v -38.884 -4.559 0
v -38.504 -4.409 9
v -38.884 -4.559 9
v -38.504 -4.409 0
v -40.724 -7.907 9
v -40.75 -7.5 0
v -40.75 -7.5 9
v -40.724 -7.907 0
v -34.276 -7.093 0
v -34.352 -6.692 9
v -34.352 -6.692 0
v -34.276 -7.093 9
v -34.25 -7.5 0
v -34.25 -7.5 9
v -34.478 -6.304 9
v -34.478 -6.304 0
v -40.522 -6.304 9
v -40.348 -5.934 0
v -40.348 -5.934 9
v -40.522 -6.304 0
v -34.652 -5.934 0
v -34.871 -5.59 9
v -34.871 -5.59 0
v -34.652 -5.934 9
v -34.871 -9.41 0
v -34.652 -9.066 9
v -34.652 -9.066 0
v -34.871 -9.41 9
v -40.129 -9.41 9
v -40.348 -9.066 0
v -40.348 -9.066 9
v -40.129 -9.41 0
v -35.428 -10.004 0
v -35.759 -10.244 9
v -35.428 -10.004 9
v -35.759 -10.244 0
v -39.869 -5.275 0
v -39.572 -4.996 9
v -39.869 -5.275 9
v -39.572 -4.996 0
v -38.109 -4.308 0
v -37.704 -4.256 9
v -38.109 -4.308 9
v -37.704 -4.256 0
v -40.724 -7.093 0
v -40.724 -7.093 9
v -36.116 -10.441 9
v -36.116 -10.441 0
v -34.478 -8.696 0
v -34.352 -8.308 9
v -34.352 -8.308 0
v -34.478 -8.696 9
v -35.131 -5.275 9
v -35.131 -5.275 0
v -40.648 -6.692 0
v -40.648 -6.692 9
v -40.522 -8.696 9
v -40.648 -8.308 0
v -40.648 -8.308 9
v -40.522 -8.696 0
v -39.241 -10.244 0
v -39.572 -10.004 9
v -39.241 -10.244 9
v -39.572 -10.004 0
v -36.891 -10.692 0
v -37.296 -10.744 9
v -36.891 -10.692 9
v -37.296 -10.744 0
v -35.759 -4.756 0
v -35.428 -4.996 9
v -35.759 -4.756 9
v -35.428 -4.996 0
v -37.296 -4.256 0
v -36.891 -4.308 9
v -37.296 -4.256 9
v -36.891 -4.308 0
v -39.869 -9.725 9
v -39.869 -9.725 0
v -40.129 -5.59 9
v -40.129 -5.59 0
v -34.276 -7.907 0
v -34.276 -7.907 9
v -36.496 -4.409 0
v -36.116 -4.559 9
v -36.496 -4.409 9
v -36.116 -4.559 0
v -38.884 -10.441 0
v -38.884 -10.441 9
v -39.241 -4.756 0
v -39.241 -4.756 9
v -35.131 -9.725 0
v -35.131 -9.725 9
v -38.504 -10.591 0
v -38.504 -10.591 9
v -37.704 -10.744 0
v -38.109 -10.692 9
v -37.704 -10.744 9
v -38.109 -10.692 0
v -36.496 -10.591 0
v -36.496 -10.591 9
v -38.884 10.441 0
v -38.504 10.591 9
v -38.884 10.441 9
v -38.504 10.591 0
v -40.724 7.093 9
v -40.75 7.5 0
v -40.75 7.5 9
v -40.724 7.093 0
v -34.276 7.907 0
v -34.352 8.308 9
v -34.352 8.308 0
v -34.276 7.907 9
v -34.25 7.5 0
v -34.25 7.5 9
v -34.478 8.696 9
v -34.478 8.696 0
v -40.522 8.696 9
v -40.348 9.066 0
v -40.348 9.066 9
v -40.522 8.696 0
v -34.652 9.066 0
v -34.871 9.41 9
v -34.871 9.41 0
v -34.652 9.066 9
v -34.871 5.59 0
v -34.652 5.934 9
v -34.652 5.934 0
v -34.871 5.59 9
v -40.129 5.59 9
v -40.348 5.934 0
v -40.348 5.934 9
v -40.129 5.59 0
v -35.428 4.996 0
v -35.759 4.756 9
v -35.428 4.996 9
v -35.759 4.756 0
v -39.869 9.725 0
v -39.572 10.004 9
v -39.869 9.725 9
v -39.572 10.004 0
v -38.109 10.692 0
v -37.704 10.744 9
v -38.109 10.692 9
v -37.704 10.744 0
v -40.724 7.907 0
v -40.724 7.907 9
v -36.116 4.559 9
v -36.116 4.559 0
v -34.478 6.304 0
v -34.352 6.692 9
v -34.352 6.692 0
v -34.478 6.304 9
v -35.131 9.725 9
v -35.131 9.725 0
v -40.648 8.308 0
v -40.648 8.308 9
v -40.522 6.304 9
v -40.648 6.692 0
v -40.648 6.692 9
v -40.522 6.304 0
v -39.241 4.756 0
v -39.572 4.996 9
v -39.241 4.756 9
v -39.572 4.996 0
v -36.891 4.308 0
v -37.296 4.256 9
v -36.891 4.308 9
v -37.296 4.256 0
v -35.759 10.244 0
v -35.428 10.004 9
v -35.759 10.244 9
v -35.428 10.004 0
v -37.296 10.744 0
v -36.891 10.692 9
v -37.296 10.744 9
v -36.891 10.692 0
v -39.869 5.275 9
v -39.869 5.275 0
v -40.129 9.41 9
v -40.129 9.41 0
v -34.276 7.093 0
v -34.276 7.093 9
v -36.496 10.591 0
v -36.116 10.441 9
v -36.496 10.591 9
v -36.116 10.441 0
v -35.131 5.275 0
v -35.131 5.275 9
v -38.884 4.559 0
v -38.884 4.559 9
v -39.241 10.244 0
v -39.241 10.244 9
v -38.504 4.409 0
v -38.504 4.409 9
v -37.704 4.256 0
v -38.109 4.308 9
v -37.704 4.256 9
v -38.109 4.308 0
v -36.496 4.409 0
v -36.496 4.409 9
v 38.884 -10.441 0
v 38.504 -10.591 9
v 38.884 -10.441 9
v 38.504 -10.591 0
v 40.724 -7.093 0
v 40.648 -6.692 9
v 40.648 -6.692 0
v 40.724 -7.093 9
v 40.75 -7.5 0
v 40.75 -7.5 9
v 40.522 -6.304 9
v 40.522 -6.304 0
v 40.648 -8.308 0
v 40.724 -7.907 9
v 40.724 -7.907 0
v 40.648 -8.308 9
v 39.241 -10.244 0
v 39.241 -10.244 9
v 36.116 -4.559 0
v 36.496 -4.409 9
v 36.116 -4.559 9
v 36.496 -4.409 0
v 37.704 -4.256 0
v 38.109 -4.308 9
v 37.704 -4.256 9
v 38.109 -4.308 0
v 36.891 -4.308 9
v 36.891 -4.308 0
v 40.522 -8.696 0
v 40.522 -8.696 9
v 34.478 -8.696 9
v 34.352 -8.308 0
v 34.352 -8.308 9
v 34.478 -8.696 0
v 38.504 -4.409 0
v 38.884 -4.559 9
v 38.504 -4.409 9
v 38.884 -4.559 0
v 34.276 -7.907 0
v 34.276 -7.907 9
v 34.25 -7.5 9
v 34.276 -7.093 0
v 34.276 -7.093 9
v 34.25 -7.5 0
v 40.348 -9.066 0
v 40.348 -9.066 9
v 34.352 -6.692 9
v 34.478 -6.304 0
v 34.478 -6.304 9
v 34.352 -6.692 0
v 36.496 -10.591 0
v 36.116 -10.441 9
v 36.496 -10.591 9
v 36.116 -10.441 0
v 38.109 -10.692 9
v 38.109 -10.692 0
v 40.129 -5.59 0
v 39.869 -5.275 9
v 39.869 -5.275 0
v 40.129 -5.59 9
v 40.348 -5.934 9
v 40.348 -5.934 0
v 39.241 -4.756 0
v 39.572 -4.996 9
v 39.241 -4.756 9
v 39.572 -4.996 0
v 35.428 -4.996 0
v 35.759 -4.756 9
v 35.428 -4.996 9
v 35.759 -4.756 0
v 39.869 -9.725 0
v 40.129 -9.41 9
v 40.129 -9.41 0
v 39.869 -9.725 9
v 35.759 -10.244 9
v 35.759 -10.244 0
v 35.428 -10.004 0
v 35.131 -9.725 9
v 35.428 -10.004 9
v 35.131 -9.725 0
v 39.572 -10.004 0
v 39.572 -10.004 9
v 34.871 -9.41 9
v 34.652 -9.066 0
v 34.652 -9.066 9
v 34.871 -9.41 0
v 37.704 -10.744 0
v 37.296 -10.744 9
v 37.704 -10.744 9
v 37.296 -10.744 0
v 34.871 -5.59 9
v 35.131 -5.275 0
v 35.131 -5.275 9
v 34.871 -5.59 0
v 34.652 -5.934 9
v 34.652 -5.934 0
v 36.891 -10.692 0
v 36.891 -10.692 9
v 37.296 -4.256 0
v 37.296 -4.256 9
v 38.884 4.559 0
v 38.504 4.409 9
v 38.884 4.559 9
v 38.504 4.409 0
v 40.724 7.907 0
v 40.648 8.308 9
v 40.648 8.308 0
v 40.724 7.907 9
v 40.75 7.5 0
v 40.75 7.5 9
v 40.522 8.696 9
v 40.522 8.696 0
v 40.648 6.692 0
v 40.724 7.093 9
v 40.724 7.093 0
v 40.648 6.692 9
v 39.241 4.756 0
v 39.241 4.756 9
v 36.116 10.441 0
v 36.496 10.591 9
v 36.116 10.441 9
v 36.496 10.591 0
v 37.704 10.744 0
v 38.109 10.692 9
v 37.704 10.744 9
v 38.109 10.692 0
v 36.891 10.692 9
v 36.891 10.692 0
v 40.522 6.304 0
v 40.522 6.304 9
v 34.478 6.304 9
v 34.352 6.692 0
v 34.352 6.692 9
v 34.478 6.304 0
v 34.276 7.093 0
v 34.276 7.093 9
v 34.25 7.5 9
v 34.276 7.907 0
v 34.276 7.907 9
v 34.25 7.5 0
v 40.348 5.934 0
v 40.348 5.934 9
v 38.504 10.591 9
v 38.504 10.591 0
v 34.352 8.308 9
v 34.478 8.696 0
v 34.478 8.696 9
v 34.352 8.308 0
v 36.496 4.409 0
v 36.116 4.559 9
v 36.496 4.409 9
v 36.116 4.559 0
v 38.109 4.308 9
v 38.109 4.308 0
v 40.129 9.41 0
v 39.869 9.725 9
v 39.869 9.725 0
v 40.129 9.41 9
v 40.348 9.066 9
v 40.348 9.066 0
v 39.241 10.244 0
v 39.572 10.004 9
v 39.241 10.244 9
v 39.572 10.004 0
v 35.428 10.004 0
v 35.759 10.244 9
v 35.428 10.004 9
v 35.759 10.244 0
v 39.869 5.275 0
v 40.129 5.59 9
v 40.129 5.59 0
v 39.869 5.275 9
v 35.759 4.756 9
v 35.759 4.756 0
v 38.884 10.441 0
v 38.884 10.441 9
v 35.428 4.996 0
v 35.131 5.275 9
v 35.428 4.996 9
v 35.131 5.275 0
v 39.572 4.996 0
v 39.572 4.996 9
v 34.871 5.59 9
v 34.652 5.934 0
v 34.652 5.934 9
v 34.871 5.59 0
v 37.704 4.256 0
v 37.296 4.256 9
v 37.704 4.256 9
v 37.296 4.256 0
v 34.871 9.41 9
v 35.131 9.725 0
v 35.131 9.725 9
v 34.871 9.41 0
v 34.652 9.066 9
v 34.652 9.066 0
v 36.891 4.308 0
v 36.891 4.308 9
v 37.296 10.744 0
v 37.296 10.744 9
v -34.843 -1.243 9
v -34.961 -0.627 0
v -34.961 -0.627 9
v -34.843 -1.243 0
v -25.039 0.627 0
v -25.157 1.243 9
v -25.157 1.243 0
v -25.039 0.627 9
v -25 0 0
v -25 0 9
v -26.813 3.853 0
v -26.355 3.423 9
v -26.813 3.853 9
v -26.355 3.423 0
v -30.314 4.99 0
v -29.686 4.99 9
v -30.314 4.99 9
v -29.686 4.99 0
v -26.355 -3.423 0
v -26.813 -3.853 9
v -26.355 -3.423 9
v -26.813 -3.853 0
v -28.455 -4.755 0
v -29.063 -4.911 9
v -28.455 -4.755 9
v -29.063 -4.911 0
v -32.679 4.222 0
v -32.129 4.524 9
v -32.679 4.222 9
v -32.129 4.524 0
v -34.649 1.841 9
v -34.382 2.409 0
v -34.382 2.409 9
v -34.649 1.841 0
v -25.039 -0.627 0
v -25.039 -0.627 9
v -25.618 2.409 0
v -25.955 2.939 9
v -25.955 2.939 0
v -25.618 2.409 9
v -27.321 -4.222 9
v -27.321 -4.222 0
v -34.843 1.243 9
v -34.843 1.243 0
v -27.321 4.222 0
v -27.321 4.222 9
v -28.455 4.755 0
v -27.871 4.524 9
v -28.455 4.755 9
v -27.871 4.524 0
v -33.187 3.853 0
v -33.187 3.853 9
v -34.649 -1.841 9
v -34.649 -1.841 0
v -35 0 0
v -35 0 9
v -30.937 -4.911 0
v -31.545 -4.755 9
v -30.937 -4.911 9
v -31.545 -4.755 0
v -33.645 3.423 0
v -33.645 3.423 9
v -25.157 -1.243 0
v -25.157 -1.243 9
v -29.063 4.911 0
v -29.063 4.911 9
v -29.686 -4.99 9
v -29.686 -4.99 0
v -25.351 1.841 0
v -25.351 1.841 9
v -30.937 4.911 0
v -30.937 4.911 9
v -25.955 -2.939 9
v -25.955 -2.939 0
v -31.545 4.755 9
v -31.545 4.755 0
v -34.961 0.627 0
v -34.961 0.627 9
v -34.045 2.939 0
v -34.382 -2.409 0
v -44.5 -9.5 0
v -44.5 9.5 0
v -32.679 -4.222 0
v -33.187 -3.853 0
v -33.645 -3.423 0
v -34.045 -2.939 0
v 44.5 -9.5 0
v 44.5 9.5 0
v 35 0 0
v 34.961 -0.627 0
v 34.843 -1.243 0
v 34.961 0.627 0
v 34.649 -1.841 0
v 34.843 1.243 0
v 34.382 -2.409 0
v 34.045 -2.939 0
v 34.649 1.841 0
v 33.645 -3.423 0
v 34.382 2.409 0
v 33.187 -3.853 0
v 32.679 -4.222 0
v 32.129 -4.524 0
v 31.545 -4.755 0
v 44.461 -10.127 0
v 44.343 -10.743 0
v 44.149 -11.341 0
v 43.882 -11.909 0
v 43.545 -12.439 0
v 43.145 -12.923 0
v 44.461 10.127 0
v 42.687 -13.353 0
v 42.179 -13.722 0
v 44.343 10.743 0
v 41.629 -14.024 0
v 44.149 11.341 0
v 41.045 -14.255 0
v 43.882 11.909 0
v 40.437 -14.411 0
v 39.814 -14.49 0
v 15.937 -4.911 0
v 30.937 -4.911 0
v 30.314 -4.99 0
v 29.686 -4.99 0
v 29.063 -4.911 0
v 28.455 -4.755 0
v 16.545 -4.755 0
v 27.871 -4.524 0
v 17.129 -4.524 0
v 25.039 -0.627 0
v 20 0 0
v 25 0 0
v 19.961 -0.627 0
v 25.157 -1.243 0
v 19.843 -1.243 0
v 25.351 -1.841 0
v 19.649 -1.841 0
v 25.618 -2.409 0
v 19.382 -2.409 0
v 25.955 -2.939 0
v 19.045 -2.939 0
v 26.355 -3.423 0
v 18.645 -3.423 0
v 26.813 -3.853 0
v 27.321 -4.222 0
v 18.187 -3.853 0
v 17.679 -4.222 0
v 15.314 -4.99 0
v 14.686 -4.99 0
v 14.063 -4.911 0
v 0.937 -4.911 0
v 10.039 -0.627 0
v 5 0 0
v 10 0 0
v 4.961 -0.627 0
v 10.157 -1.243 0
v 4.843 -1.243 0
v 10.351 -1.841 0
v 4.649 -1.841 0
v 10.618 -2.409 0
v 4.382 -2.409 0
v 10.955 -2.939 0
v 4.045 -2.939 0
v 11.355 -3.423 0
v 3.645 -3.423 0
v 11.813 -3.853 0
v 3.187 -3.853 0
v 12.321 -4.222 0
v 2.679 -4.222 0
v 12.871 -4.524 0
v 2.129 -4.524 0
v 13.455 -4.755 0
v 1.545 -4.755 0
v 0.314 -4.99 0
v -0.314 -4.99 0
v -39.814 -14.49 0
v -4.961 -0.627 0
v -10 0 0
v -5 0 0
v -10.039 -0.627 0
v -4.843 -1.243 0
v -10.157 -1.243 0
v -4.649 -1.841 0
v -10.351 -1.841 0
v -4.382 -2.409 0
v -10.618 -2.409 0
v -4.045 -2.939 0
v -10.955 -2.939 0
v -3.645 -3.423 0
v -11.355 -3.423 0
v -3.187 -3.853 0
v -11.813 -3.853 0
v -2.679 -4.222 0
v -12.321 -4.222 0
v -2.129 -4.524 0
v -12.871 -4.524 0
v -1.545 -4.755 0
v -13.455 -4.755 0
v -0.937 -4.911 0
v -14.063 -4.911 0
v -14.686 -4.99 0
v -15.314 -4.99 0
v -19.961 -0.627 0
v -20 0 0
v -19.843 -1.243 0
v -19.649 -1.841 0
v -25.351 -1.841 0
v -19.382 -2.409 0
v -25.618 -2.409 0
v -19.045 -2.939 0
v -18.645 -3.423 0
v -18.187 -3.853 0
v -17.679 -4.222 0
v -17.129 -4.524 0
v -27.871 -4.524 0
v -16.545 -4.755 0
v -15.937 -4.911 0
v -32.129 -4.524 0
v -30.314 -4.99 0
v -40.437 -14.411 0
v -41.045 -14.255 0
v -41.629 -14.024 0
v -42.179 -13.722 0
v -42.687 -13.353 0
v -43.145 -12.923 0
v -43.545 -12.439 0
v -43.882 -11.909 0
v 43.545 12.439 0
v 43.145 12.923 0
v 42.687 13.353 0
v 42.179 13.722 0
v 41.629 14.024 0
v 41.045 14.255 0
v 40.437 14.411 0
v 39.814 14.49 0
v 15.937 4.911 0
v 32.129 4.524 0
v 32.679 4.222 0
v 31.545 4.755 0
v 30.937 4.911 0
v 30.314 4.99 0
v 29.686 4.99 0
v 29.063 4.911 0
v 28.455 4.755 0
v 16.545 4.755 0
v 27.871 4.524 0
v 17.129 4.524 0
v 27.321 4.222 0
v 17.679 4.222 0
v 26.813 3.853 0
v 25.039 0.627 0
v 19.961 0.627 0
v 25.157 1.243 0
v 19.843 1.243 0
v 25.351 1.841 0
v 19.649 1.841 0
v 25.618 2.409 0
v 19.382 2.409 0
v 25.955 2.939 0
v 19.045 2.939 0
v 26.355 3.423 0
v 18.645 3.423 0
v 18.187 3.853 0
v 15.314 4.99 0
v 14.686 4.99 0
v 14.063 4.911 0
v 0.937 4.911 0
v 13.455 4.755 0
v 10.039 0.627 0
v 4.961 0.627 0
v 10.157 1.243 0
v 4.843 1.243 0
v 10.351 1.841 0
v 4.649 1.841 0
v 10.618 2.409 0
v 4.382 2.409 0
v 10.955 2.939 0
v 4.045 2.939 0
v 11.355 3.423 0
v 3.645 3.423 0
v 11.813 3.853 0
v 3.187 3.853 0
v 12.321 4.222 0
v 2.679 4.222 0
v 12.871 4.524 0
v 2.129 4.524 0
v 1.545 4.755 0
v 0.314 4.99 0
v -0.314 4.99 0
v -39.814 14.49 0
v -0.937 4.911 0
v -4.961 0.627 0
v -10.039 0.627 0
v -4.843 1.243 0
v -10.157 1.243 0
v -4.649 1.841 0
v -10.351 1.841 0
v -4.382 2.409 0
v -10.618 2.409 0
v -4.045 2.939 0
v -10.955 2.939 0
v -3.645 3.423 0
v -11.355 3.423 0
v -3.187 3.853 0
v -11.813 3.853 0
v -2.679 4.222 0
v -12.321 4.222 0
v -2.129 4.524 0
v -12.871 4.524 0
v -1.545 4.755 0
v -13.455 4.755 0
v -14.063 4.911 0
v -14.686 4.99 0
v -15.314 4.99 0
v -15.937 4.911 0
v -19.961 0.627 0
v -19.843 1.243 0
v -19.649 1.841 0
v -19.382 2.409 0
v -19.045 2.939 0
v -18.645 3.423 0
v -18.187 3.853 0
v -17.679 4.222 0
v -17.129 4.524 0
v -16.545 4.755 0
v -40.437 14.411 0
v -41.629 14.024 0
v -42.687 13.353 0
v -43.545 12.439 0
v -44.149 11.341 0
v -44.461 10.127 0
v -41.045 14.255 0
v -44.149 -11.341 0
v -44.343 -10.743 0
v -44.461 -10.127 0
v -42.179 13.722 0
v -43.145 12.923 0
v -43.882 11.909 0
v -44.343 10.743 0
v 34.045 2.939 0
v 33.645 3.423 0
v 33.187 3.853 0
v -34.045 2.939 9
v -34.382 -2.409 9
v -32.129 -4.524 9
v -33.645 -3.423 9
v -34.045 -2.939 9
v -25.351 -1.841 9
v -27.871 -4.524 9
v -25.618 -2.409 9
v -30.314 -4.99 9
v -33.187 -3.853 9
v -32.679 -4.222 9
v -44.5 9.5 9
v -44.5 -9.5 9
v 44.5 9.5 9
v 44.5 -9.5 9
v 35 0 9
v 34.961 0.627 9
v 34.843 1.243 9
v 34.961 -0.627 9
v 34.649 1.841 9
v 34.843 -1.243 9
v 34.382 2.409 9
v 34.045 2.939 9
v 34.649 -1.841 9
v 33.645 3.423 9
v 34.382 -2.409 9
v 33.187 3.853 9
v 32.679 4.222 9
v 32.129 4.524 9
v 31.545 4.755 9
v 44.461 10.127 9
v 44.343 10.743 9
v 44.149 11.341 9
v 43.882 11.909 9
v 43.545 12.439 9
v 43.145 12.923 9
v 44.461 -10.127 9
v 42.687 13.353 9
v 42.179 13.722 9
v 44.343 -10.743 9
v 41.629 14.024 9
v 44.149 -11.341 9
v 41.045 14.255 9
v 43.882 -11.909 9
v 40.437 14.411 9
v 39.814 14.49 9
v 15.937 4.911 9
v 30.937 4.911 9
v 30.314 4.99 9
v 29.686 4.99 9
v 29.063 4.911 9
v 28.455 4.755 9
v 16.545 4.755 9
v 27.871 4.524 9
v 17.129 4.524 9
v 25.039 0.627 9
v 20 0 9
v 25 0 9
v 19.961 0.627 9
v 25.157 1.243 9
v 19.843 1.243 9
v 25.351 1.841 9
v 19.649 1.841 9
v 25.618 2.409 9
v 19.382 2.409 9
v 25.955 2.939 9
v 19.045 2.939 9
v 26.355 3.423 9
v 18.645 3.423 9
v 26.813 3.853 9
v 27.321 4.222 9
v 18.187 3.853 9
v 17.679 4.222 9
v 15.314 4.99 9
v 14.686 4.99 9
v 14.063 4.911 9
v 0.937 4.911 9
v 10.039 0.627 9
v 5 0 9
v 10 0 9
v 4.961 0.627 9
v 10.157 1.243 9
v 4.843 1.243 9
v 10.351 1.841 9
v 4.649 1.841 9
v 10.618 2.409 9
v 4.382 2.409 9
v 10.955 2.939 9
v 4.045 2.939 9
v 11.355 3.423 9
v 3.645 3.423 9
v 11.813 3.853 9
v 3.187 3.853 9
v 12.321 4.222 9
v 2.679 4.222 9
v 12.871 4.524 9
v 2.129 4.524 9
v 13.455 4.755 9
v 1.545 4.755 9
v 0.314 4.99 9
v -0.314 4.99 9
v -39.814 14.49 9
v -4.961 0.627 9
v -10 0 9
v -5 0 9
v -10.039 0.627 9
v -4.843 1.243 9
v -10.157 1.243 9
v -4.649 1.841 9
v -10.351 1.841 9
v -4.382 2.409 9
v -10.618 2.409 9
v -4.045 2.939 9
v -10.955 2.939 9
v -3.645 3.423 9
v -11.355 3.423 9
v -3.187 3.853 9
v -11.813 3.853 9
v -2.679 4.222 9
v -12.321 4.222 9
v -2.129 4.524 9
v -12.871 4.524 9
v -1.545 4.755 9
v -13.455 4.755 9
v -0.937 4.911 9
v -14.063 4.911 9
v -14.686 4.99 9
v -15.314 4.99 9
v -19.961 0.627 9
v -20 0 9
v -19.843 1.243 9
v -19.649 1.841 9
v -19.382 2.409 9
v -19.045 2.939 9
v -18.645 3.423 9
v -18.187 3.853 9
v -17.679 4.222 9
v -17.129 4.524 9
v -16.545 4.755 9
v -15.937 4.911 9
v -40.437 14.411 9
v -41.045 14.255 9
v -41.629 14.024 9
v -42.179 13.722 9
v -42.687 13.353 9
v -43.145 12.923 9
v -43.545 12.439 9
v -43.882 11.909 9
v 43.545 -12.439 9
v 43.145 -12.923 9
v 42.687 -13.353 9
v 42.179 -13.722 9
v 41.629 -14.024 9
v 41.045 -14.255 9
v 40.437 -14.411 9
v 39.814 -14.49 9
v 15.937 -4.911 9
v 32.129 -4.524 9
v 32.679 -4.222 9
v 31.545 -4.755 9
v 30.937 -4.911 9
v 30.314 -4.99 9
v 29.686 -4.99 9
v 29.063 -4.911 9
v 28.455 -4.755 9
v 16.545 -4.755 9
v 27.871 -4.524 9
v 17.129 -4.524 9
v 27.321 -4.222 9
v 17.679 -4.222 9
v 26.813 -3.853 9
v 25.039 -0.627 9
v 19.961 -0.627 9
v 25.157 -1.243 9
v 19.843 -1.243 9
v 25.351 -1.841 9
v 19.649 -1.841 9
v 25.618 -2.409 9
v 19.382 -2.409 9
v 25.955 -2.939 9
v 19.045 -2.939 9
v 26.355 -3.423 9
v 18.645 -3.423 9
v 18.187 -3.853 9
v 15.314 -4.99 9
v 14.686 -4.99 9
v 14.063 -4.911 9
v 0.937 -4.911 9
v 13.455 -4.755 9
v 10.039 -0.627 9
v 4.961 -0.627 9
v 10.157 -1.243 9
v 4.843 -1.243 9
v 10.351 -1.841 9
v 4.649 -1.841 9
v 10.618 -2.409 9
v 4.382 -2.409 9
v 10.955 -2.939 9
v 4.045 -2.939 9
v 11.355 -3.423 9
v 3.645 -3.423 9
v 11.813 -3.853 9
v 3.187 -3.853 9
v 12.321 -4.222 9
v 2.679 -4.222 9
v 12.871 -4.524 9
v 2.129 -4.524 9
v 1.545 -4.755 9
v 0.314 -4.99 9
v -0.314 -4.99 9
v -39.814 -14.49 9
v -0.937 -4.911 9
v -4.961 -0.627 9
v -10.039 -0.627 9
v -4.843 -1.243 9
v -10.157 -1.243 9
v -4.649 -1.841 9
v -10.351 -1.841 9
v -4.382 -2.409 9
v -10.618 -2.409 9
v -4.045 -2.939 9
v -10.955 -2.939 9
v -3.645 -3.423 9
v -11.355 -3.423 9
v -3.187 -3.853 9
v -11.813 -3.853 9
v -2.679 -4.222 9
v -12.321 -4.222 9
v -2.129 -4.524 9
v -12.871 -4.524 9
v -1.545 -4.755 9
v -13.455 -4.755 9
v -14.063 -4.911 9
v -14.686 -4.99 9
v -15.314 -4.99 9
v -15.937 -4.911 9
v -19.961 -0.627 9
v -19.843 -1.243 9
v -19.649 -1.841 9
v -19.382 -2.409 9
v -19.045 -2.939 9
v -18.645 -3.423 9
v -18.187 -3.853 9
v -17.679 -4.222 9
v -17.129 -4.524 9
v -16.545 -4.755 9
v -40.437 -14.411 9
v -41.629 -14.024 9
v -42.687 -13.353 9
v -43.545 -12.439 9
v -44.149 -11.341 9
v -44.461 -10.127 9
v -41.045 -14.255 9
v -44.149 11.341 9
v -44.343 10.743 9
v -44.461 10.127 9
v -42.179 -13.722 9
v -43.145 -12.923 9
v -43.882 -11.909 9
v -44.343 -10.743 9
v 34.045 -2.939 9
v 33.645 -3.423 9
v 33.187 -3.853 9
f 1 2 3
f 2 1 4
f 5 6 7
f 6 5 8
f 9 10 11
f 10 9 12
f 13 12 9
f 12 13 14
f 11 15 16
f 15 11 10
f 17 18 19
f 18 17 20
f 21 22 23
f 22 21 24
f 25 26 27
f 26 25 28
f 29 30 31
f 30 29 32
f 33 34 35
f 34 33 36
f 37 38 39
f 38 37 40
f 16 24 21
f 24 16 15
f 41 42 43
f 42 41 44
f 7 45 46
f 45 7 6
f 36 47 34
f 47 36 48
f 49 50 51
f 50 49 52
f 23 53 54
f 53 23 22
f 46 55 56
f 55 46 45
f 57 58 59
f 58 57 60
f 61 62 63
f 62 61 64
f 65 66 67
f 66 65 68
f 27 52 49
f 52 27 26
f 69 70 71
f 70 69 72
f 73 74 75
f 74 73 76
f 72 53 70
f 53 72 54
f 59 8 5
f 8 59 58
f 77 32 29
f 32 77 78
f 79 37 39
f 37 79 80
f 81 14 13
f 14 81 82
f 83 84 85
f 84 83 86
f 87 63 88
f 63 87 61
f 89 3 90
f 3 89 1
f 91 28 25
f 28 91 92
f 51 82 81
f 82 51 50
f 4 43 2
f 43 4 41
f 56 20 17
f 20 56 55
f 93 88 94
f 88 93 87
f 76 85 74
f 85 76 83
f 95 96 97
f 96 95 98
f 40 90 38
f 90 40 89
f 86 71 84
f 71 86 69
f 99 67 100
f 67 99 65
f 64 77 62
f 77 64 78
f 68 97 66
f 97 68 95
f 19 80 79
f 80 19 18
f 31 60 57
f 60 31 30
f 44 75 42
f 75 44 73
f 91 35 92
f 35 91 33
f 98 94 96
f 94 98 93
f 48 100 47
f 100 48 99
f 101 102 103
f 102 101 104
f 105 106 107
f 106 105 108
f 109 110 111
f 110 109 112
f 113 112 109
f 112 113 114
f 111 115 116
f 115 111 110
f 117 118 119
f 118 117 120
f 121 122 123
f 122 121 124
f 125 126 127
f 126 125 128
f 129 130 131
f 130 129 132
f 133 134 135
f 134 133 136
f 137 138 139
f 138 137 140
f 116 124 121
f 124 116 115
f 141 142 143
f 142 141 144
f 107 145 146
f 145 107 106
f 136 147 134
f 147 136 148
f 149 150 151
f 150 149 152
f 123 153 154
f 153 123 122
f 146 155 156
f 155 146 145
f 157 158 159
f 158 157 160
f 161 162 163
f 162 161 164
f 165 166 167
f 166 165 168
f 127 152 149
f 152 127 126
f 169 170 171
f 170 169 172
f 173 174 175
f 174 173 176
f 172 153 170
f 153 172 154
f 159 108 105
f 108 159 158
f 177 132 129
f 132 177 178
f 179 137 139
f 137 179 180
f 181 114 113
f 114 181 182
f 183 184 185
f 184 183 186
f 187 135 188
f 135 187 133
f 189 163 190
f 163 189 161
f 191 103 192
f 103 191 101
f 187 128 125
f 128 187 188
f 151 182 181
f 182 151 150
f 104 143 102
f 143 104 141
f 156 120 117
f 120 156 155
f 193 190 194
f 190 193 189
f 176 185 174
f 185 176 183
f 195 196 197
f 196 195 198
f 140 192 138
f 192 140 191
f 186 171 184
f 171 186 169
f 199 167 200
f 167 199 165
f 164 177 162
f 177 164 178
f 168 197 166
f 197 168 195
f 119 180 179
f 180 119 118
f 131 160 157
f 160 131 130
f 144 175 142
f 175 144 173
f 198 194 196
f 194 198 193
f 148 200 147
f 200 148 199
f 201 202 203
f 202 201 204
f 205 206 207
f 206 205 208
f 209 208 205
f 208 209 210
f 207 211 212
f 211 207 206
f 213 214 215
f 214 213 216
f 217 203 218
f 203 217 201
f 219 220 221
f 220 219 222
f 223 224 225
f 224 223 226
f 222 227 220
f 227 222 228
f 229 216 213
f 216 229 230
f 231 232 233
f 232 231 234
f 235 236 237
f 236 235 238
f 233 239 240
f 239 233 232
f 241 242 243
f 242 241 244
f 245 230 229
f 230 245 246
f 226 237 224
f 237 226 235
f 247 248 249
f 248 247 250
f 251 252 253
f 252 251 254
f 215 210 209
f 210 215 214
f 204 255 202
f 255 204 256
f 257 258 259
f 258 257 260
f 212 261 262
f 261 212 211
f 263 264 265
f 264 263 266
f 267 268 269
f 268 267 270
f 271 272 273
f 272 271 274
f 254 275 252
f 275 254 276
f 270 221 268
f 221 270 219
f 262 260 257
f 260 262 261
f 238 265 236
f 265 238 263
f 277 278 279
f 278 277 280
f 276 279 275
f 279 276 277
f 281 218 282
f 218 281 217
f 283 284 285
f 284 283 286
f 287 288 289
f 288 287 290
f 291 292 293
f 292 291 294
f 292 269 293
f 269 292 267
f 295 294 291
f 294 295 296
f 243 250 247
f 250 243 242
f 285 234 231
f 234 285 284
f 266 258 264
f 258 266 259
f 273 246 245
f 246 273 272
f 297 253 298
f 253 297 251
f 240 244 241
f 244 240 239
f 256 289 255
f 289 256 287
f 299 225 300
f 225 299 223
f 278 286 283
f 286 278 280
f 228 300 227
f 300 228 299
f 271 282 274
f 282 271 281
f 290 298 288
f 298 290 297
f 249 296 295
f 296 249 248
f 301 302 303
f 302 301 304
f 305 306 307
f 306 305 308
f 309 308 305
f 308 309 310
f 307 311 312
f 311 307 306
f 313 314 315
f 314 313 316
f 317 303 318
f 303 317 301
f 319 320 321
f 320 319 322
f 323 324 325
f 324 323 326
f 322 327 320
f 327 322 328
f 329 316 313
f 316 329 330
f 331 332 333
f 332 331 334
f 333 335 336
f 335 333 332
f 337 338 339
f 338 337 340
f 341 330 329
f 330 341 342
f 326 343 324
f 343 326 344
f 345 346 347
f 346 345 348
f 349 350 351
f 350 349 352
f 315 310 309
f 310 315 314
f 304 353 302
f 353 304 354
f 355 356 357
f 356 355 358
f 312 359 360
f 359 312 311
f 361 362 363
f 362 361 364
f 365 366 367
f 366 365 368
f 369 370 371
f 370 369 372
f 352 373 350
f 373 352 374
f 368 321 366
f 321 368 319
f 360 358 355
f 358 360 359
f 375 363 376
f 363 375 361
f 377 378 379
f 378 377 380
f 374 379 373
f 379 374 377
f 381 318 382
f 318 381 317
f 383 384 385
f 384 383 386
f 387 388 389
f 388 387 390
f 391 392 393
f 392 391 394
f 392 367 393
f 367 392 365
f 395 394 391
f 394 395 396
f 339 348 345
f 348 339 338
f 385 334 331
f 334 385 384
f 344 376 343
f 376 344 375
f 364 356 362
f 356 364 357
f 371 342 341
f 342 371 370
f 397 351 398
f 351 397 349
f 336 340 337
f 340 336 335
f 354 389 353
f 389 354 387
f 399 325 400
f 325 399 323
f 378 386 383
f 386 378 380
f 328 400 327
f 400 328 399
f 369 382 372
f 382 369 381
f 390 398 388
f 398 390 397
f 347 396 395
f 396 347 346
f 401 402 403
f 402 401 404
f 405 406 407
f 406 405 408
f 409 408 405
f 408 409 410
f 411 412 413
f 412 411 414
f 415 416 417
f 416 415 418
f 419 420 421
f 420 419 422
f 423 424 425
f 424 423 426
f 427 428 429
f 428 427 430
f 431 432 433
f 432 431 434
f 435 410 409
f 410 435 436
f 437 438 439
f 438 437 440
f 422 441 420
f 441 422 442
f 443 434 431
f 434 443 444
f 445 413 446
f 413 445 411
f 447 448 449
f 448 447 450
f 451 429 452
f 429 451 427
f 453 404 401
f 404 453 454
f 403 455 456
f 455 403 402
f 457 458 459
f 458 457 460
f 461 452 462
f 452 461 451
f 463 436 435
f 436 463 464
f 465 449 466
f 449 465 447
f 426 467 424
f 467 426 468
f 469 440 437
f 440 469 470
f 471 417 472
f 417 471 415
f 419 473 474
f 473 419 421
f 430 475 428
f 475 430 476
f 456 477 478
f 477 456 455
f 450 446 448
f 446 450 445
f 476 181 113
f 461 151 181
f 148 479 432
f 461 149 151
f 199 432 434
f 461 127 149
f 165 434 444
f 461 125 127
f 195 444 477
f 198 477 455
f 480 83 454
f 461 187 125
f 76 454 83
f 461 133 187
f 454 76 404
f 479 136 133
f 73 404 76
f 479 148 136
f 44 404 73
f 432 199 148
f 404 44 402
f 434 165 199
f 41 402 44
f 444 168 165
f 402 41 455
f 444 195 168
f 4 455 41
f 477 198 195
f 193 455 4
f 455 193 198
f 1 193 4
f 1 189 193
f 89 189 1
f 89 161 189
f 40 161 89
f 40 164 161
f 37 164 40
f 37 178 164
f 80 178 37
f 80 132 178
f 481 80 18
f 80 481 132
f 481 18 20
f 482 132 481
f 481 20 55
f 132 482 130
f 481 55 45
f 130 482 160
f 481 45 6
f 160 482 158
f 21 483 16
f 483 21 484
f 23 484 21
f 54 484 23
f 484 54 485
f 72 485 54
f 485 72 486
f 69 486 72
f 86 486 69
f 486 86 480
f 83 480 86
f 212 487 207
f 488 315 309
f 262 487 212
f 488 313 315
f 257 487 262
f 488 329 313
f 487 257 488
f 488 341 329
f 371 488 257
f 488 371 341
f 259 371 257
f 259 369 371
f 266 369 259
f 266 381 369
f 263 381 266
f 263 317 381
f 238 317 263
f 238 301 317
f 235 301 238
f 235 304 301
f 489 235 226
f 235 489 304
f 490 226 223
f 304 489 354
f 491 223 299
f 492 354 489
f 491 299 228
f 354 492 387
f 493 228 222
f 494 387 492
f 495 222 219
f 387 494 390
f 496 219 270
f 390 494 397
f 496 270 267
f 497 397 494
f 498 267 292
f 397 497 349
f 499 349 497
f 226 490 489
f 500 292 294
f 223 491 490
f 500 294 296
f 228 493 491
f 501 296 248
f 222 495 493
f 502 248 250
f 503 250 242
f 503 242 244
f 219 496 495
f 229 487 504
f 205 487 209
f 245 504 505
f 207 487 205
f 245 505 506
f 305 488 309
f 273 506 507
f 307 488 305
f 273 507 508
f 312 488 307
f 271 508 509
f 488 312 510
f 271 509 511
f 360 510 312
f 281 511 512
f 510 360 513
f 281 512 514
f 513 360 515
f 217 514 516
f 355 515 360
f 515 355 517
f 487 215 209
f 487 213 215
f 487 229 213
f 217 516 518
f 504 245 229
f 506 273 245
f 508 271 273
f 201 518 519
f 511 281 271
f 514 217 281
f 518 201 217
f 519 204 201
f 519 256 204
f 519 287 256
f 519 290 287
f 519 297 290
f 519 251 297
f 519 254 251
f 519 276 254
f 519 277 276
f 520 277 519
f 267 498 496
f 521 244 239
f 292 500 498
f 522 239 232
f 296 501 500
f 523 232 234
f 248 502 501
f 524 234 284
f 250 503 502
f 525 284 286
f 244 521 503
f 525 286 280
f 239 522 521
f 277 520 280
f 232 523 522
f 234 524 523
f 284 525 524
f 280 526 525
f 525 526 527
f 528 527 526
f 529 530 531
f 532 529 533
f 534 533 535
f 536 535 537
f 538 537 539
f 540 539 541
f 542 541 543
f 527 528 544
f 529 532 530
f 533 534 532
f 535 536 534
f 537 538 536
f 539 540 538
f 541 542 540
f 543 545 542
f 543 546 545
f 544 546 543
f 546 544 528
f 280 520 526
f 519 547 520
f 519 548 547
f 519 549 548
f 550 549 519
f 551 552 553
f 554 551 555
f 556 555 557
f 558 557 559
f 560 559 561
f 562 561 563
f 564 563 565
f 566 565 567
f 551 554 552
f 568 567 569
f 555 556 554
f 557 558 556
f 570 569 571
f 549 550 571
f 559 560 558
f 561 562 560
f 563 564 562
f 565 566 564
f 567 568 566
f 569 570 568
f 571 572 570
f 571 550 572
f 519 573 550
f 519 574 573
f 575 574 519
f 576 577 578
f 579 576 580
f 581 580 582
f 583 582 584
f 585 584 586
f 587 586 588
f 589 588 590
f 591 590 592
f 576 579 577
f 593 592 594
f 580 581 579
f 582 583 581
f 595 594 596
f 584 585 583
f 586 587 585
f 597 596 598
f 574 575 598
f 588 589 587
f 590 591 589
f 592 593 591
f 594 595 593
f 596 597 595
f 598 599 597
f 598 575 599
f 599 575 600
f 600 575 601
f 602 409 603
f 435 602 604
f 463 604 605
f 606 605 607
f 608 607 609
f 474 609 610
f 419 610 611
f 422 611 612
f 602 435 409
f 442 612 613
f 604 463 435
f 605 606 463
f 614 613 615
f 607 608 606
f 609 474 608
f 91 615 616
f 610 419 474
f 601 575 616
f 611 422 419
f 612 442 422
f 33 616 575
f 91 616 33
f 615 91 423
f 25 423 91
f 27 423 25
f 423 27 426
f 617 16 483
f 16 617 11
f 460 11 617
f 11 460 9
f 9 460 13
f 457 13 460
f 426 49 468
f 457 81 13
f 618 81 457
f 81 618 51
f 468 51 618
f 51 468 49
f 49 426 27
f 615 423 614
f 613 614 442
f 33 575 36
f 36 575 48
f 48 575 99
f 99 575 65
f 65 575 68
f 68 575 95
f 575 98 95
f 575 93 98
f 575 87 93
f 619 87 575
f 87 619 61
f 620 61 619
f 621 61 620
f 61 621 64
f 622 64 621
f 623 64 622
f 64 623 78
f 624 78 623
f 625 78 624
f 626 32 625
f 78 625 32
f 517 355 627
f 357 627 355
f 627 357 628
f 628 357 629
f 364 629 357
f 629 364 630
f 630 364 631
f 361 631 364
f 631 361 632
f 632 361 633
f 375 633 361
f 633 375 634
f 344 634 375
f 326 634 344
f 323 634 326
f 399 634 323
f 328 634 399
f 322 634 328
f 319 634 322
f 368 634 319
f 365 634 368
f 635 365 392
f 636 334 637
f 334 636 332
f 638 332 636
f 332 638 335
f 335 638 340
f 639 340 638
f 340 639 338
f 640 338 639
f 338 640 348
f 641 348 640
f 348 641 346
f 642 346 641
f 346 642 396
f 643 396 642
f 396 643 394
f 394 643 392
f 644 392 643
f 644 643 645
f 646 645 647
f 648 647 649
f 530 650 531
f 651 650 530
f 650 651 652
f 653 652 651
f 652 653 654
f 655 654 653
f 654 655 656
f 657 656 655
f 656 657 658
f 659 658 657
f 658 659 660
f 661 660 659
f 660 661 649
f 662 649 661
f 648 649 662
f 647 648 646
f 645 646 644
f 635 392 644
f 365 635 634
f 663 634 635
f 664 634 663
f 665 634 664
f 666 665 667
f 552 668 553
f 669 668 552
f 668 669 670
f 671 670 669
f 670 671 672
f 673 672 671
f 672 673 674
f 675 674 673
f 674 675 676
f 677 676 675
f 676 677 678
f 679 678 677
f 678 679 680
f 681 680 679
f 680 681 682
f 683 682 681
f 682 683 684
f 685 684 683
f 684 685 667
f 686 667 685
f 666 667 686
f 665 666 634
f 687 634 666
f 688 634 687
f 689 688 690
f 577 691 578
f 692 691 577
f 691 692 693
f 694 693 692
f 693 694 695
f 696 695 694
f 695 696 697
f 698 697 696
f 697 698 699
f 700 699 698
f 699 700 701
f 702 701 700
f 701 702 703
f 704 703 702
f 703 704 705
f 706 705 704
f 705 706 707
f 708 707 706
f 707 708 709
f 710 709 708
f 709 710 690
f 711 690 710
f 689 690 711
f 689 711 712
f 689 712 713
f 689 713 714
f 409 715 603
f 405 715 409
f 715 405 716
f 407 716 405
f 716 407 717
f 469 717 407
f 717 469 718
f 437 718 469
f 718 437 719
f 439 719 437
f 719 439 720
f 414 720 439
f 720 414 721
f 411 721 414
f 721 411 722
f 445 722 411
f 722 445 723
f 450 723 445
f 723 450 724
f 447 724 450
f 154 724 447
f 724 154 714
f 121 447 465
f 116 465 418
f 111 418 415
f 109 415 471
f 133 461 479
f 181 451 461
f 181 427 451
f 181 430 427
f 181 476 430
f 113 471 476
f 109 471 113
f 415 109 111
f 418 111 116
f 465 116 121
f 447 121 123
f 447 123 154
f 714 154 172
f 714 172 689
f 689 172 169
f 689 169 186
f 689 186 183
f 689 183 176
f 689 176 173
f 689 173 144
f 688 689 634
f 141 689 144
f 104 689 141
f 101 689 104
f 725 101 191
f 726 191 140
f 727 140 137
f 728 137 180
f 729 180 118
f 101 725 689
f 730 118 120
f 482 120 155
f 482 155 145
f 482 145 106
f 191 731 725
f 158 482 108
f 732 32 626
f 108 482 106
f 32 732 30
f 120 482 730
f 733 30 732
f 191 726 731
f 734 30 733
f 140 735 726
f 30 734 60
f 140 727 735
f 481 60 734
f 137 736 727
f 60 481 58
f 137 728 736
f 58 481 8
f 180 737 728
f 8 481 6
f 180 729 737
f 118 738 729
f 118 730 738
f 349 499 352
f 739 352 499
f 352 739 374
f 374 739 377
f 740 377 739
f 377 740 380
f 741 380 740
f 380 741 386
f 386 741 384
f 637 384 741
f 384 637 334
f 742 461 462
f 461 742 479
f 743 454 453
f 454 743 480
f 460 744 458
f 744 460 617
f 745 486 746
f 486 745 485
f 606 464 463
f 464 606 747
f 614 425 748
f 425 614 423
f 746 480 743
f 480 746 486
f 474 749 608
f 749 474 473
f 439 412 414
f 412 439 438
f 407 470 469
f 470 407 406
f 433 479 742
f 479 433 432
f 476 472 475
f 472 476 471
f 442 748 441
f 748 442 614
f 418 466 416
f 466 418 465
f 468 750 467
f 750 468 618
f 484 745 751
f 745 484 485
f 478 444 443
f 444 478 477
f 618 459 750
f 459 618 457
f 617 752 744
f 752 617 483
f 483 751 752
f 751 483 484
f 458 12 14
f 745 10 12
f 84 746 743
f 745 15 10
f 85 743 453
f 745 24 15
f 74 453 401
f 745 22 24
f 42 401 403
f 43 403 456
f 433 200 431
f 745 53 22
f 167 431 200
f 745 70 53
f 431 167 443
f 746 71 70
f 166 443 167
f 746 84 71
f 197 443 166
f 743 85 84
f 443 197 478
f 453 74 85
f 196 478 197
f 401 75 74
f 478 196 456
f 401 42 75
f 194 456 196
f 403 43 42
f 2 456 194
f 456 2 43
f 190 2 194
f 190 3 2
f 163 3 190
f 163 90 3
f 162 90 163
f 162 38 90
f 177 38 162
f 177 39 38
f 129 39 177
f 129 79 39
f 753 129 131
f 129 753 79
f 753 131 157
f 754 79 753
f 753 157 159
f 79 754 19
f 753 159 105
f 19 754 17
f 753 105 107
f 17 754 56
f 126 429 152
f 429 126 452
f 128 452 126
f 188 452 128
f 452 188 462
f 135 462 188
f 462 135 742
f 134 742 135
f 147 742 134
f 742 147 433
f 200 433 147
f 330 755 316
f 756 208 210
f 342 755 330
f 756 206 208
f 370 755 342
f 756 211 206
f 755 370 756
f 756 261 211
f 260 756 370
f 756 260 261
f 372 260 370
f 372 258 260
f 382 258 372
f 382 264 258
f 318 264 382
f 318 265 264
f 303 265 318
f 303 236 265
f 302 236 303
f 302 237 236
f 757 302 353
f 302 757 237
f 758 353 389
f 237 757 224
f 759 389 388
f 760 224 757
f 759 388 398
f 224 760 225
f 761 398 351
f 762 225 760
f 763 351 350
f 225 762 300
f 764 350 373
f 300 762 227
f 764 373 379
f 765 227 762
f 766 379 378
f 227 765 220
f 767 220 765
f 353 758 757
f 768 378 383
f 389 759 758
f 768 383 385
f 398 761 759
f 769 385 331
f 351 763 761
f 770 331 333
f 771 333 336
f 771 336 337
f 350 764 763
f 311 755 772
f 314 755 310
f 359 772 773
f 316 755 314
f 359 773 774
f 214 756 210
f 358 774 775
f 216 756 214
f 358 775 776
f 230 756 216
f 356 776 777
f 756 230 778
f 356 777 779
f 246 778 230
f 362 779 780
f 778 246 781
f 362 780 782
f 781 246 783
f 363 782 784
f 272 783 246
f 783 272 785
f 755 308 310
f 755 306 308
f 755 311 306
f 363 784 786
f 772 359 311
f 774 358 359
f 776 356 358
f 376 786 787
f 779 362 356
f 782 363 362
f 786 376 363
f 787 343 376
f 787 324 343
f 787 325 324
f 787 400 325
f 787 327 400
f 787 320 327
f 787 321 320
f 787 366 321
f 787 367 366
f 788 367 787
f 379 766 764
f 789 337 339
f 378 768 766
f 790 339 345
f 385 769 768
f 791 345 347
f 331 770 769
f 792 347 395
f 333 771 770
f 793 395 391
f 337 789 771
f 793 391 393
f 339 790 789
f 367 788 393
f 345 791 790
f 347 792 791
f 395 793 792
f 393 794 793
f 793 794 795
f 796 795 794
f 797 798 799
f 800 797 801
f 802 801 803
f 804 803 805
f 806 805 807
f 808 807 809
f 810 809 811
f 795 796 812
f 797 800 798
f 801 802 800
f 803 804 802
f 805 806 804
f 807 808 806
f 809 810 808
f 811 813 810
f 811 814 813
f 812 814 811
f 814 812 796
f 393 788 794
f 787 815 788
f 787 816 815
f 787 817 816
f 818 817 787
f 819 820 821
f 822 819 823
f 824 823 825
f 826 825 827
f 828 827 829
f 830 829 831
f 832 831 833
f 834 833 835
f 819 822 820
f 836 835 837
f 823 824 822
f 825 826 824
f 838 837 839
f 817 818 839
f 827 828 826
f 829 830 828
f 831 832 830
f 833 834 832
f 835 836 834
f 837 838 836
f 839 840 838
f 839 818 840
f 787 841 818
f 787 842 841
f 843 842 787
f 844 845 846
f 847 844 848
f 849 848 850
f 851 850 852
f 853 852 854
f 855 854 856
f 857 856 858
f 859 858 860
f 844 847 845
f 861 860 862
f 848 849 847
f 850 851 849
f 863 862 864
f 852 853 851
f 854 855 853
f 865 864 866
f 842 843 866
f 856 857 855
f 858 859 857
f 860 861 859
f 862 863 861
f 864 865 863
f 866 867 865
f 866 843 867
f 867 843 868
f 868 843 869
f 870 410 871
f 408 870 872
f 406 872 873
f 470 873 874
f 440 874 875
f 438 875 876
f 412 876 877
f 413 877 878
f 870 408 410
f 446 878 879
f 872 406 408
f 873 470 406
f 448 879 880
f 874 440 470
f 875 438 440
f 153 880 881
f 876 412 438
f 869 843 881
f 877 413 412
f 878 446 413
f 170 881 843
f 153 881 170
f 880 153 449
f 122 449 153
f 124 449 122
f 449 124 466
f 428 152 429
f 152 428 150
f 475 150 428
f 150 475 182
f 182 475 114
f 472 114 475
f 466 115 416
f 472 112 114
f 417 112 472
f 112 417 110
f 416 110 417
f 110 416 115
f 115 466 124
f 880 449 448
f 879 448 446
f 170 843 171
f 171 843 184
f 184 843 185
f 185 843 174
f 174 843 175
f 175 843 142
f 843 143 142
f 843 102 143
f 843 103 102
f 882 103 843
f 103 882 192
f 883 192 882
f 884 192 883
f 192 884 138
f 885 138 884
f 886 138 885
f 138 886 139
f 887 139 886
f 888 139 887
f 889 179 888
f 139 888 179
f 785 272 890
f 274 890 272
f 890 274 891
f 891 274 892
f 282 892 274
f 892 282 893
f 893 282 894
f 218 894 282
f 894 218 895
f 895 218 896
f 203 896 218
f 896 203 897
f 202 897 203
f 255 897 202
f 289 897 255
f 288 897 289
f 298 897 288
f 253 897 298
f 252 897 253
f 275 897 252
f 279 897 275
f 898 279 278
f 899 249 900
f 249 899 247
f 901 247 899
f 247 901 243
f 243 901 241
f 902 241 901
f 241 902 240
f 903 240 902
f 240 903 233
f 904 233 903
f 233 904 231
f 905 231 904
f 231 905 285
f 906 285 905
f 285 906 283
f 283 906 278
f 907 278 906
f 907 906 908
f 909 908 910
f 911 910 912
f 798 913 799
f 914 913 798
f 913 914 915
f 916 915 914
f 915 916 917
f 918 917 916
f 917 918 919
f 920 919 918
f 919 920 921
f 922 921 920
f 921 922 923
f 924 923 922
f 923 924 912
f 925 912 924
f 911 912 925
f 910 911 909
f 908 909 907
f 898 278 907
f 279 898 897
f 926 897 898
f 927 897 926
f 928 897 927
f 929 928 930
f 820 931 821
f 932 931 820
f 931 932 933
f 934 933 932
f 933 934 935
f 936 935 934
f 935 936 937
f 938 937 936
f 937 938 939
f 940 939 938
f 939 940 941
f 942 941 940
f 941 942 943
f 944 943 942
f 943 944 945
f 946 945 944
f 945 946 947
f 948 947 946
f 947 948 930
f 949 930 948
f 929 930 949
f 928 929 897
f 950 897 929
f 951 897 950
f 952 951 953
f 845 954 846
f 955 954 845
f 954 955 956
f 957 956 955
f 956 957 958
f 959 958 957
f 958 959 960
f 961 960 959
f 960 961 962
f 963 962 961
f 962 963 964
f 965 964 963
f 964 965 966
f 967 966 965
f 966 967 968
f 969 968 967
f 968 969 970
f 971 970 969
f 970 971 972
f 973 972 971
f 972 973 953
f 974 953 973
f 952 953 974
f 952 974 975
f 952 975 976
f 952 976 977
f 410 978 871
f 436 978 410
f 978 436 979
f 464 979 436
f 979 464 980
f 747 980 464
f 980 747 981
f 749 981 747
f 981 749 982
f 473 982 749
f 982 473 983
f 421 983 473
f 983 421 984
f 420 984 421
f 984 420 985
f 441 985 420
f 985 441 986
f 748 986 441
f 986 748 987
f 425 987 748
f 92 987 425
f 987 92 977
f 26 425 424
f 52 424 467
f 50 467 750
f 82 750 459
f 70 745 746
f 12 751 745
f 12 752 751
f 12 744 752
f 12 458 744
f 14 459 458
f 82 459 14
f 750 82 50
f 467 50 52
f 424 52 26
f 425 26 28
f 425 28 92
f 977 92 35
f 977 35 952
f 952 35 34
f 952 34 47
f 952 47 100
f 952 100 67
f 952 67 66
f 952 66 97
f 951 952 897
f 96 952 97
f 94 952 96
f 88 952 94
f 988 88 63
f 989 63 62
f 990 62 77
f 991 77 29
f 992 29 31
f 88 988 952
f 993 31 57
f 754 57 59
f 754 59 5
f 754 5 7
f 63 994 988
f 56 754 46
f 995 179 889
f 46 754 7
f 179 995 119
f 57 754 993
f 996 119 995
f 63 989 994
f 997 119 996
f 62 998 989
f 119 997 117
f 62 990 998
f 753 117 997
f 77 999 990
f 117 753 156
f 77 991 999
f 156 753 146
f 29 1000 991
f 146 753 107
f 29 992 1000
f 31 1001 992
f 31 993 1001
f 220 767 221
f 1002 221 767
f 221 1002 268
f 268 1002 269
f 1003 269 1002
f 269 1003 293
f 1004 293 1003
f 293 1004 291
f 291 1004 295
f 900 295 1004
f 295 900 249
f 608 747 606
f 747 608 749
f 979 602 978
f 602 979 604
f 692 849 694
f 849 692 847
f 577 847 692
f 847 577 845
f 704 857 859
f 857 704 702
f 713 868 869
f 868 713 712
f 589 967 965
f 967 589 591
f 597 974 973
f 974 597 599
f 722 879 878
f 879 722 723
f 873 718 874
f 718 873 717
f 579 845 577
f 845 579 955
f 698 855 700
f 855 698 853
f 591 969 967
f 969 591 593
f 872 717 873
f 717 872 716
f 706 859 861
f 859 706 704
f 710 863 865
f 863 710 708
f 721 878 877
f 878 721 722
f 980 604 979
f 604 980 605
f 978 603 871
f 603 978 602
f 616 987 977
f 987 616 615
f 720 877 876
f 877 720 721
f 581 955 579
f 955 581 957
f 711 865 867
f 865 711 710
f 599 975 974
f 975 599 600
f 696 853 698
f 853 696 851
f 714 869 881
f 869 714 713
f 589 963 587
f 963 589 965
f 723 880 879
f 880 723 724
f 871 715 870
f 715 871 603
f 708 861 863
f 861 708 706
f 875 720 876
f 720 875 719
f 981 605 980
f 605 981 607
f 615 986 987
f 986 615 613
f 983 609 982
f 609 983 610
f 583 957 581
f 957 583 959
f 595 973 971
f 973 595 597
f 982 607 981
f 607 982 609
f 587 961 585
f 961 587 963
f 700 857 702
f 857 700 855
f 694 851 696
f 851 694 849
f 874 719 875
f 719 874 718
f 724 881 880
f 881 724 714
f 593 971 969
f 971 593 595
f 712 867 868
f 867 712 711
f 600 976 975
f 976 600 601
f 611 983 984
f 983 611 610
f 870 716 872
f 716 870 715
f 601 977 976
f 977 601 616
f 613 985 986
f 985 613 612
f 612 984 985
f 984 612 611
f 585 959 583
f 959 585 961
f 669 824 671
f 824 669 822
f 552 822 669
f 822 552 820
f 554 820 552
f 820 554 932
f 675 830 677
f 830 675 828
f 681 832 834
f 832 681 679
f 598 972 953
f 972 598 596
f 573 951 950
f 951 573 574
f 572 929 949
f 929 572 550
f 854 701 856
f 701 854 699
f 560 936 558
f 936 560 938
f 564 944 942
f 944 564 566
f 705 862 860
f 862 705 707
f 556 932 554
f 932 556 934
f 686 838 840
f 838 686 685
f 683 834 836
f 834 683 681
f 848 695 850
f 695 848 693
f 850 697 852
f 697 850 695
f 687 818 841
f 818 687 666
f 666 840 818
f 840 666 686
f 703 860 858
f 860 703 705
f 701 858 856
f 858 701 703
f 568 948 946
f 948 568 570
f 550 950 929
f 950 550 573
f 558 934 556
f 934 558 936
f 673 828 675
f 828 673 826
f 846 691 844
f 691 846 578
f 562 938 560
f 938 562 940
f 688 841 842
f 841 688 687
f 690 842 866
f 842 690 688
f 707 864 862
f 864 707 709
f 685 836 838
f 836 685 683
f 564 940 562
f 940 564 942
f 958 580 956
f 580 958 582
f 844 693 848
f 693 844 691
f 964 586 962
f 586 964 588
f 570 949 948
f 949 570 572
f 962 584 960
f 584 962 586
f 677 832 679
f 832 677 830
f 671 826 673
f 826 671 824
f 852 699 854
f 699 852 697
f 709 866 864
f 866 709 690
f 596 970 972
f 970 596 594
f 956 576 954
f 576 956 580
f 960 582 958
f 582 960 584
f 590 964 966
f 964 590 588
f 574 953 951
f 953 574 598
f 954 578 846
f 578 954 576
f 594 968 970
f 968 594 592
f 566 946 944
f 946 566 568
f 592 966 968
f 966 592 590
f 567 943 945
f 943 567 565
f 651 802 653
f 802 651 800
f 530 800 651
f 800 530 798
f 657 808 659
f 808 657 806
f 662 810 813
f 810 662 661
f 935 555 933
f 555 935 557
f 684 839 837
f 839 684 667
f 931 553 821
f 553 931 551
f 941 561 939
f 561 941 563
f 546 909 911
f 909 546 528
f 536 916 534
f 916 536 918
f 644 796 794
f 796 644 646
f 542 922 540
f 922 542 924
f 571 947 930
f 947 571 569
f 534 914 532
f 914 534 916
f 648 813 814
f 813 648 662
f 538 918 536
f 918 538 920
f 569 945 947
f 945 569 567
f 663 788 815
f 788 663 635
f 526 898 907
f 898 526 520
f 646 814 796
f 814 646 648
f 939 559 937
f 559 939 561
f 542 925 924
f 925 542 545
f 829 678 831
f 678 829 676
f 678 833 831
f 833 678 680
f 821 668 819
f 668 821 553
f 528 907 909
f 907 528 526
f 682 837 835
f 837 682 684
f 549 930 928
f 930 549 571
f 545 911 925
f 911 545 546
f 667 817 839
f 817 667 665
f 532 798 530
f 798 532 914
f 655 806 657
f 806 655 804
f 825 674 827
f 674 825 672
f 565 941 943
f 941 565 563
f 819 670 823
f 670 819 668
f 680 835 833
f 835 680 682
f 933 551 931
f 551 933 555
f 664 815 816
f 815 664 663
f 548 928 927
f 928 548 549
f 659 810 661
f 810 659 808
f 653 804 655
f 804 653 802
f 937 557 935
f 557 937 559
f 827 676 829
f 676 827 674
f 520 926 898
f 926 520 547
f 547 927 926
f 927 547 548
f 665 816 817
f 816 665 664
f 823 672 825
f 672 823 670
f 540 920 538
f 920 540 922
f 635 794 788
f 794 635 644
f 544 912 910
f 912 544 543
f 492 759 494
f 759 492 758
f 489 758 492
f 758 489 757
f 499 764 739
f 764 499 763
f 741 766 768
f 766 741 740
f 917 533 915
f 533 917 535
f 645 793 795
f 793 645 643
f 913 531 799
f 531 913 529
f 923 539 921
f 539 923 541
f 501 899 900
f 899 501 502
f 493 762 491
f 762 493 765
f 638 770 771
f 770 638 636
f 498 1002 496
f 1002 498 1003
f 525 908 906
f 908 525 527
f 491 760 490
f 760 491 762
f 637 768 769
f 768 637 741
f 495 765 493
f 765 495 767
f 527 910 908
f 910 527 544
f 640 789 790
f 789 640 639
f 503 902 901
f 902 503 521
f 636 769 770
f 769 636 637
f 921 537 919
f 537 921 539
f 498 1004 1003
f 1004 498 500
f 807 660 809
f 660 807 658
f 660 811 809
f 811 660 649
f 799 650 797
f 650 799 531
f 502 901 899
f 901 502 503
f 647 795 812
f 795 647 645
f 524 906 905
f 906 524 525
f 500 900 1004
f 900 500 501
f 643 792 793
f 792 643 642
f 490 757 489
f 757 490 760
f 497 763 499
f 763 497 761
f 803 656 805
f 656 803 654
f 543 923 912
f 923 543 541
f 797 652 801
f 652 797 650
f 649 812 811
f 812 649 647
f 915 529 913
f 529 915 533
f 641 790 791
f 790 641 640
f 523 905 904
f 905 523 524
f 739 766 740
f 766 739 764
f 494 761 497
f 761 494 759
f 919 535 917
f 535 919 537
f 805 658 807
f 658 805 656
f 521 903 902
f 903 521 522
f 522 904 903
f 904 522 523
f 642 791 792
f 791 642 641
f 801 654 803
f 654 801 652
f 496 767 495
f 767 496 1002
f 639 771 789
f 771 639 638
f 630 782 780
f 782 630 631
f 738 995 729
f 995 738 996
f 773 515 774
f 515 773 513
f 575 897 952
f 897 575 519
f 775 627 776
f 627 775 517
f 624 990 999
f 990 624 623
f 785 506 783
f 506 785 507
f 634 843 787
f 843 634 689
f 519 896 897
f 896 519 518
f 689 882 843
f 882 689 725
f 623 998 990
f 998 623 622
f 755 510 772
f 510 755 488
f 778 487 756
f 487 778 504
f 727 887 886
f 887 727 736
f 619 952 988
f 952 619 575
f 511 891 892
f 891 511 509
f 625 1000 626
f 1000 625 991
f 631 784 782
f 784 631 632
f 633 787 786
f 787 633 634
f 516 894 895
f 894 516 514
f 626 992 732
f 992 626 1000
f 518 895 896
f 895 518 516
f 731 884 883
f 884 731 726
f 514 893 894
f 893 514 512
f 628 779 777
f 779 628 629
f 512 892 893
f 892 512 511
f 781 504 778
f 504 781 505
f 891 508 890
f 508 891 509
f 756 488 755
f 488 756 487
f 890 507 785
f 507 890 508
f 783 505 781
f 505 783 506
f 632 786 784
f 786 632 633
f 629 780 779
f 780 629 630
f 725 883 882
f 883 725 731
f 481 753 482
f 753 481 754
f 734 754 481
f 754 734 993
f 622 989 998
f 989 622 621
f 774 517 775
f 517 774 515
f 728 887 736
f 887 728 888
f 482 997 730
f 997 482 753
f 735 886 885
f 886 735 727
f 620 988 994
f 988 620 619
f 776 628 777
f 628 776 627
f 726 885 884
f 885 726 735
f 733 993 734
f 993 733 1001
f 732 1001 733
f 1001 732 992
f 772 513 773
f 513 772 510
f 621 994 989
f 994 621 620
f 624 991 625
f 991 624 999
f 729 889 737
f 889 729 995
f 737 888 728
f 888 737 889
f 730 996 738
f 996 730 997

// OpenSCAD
$fn = 50;

difference() {
	union() {
		hull() {
			translate(v = [-39.5, 9.5, 0]) {
				cylinder(h = 9, r = 5);
			}
			translate(v = [39.5, 9.5, 0]) {
				cylinder(h = 9, r = 5);
			}
			translate(v = [-39.5, -9.5, 0]) {
				cylinder(h = 9, r = 5);
			}
			translate(v = [39.5, -9.5, 0]) {
				cylinder(h = 9, r = 5);
			}
		}
	}
	union() {
		translate(v = [-37.5, -7.5, -100.0]) {
			cylinder(h = 200, r = 3.25);
		}
		translate(v = [-37.5, 7.5, -100.0]) {
			cylinder(h = 200, r = 3.25);
		}
		translate(v = [37.5, -7.5, -100.0]) {
			cylinder(h = 200, r = 3.25);
		}
		translate(v = [37.5, 7.5, -100.0]) {
			cylinder(h = 200, r = 3.25);
		}
		translate(v = [-37.5, -7.5, -100.0]) {
			cylinder(h = 200, r = 1.8);
		}
		translate(v = [-37.5, 7.5, -100.0]) {
			cylinder(h = 200, r = 1.8);
		}
		translate(v = [37.5, -7.5, -100.0]) {
			cylinder(h = 200, r = 1.8);
		}
		translate(v = [37.5, 7.5, -100.0]) {
			cylinder(h = 200, r = 1.8);
		}
		translate(v = [-30.0, 0, 0.0]) {
			cylinder(h = 9, r = 5.0);
		}
		translate(v = [-15.0, 0, 0.0]) {
			cylinder(h = 9, r = 5.0);
		}
		cylinder(h = 9, r = 5.0);
		translate(v = [15.0, 0, 0.0]) {
			cylinder(h = 9, r = 5.0);
		}
		translate(v = [30.0, 0, 0.0]) {
			cylinder(h = 9, r = 5.0);
		}
	}
}
